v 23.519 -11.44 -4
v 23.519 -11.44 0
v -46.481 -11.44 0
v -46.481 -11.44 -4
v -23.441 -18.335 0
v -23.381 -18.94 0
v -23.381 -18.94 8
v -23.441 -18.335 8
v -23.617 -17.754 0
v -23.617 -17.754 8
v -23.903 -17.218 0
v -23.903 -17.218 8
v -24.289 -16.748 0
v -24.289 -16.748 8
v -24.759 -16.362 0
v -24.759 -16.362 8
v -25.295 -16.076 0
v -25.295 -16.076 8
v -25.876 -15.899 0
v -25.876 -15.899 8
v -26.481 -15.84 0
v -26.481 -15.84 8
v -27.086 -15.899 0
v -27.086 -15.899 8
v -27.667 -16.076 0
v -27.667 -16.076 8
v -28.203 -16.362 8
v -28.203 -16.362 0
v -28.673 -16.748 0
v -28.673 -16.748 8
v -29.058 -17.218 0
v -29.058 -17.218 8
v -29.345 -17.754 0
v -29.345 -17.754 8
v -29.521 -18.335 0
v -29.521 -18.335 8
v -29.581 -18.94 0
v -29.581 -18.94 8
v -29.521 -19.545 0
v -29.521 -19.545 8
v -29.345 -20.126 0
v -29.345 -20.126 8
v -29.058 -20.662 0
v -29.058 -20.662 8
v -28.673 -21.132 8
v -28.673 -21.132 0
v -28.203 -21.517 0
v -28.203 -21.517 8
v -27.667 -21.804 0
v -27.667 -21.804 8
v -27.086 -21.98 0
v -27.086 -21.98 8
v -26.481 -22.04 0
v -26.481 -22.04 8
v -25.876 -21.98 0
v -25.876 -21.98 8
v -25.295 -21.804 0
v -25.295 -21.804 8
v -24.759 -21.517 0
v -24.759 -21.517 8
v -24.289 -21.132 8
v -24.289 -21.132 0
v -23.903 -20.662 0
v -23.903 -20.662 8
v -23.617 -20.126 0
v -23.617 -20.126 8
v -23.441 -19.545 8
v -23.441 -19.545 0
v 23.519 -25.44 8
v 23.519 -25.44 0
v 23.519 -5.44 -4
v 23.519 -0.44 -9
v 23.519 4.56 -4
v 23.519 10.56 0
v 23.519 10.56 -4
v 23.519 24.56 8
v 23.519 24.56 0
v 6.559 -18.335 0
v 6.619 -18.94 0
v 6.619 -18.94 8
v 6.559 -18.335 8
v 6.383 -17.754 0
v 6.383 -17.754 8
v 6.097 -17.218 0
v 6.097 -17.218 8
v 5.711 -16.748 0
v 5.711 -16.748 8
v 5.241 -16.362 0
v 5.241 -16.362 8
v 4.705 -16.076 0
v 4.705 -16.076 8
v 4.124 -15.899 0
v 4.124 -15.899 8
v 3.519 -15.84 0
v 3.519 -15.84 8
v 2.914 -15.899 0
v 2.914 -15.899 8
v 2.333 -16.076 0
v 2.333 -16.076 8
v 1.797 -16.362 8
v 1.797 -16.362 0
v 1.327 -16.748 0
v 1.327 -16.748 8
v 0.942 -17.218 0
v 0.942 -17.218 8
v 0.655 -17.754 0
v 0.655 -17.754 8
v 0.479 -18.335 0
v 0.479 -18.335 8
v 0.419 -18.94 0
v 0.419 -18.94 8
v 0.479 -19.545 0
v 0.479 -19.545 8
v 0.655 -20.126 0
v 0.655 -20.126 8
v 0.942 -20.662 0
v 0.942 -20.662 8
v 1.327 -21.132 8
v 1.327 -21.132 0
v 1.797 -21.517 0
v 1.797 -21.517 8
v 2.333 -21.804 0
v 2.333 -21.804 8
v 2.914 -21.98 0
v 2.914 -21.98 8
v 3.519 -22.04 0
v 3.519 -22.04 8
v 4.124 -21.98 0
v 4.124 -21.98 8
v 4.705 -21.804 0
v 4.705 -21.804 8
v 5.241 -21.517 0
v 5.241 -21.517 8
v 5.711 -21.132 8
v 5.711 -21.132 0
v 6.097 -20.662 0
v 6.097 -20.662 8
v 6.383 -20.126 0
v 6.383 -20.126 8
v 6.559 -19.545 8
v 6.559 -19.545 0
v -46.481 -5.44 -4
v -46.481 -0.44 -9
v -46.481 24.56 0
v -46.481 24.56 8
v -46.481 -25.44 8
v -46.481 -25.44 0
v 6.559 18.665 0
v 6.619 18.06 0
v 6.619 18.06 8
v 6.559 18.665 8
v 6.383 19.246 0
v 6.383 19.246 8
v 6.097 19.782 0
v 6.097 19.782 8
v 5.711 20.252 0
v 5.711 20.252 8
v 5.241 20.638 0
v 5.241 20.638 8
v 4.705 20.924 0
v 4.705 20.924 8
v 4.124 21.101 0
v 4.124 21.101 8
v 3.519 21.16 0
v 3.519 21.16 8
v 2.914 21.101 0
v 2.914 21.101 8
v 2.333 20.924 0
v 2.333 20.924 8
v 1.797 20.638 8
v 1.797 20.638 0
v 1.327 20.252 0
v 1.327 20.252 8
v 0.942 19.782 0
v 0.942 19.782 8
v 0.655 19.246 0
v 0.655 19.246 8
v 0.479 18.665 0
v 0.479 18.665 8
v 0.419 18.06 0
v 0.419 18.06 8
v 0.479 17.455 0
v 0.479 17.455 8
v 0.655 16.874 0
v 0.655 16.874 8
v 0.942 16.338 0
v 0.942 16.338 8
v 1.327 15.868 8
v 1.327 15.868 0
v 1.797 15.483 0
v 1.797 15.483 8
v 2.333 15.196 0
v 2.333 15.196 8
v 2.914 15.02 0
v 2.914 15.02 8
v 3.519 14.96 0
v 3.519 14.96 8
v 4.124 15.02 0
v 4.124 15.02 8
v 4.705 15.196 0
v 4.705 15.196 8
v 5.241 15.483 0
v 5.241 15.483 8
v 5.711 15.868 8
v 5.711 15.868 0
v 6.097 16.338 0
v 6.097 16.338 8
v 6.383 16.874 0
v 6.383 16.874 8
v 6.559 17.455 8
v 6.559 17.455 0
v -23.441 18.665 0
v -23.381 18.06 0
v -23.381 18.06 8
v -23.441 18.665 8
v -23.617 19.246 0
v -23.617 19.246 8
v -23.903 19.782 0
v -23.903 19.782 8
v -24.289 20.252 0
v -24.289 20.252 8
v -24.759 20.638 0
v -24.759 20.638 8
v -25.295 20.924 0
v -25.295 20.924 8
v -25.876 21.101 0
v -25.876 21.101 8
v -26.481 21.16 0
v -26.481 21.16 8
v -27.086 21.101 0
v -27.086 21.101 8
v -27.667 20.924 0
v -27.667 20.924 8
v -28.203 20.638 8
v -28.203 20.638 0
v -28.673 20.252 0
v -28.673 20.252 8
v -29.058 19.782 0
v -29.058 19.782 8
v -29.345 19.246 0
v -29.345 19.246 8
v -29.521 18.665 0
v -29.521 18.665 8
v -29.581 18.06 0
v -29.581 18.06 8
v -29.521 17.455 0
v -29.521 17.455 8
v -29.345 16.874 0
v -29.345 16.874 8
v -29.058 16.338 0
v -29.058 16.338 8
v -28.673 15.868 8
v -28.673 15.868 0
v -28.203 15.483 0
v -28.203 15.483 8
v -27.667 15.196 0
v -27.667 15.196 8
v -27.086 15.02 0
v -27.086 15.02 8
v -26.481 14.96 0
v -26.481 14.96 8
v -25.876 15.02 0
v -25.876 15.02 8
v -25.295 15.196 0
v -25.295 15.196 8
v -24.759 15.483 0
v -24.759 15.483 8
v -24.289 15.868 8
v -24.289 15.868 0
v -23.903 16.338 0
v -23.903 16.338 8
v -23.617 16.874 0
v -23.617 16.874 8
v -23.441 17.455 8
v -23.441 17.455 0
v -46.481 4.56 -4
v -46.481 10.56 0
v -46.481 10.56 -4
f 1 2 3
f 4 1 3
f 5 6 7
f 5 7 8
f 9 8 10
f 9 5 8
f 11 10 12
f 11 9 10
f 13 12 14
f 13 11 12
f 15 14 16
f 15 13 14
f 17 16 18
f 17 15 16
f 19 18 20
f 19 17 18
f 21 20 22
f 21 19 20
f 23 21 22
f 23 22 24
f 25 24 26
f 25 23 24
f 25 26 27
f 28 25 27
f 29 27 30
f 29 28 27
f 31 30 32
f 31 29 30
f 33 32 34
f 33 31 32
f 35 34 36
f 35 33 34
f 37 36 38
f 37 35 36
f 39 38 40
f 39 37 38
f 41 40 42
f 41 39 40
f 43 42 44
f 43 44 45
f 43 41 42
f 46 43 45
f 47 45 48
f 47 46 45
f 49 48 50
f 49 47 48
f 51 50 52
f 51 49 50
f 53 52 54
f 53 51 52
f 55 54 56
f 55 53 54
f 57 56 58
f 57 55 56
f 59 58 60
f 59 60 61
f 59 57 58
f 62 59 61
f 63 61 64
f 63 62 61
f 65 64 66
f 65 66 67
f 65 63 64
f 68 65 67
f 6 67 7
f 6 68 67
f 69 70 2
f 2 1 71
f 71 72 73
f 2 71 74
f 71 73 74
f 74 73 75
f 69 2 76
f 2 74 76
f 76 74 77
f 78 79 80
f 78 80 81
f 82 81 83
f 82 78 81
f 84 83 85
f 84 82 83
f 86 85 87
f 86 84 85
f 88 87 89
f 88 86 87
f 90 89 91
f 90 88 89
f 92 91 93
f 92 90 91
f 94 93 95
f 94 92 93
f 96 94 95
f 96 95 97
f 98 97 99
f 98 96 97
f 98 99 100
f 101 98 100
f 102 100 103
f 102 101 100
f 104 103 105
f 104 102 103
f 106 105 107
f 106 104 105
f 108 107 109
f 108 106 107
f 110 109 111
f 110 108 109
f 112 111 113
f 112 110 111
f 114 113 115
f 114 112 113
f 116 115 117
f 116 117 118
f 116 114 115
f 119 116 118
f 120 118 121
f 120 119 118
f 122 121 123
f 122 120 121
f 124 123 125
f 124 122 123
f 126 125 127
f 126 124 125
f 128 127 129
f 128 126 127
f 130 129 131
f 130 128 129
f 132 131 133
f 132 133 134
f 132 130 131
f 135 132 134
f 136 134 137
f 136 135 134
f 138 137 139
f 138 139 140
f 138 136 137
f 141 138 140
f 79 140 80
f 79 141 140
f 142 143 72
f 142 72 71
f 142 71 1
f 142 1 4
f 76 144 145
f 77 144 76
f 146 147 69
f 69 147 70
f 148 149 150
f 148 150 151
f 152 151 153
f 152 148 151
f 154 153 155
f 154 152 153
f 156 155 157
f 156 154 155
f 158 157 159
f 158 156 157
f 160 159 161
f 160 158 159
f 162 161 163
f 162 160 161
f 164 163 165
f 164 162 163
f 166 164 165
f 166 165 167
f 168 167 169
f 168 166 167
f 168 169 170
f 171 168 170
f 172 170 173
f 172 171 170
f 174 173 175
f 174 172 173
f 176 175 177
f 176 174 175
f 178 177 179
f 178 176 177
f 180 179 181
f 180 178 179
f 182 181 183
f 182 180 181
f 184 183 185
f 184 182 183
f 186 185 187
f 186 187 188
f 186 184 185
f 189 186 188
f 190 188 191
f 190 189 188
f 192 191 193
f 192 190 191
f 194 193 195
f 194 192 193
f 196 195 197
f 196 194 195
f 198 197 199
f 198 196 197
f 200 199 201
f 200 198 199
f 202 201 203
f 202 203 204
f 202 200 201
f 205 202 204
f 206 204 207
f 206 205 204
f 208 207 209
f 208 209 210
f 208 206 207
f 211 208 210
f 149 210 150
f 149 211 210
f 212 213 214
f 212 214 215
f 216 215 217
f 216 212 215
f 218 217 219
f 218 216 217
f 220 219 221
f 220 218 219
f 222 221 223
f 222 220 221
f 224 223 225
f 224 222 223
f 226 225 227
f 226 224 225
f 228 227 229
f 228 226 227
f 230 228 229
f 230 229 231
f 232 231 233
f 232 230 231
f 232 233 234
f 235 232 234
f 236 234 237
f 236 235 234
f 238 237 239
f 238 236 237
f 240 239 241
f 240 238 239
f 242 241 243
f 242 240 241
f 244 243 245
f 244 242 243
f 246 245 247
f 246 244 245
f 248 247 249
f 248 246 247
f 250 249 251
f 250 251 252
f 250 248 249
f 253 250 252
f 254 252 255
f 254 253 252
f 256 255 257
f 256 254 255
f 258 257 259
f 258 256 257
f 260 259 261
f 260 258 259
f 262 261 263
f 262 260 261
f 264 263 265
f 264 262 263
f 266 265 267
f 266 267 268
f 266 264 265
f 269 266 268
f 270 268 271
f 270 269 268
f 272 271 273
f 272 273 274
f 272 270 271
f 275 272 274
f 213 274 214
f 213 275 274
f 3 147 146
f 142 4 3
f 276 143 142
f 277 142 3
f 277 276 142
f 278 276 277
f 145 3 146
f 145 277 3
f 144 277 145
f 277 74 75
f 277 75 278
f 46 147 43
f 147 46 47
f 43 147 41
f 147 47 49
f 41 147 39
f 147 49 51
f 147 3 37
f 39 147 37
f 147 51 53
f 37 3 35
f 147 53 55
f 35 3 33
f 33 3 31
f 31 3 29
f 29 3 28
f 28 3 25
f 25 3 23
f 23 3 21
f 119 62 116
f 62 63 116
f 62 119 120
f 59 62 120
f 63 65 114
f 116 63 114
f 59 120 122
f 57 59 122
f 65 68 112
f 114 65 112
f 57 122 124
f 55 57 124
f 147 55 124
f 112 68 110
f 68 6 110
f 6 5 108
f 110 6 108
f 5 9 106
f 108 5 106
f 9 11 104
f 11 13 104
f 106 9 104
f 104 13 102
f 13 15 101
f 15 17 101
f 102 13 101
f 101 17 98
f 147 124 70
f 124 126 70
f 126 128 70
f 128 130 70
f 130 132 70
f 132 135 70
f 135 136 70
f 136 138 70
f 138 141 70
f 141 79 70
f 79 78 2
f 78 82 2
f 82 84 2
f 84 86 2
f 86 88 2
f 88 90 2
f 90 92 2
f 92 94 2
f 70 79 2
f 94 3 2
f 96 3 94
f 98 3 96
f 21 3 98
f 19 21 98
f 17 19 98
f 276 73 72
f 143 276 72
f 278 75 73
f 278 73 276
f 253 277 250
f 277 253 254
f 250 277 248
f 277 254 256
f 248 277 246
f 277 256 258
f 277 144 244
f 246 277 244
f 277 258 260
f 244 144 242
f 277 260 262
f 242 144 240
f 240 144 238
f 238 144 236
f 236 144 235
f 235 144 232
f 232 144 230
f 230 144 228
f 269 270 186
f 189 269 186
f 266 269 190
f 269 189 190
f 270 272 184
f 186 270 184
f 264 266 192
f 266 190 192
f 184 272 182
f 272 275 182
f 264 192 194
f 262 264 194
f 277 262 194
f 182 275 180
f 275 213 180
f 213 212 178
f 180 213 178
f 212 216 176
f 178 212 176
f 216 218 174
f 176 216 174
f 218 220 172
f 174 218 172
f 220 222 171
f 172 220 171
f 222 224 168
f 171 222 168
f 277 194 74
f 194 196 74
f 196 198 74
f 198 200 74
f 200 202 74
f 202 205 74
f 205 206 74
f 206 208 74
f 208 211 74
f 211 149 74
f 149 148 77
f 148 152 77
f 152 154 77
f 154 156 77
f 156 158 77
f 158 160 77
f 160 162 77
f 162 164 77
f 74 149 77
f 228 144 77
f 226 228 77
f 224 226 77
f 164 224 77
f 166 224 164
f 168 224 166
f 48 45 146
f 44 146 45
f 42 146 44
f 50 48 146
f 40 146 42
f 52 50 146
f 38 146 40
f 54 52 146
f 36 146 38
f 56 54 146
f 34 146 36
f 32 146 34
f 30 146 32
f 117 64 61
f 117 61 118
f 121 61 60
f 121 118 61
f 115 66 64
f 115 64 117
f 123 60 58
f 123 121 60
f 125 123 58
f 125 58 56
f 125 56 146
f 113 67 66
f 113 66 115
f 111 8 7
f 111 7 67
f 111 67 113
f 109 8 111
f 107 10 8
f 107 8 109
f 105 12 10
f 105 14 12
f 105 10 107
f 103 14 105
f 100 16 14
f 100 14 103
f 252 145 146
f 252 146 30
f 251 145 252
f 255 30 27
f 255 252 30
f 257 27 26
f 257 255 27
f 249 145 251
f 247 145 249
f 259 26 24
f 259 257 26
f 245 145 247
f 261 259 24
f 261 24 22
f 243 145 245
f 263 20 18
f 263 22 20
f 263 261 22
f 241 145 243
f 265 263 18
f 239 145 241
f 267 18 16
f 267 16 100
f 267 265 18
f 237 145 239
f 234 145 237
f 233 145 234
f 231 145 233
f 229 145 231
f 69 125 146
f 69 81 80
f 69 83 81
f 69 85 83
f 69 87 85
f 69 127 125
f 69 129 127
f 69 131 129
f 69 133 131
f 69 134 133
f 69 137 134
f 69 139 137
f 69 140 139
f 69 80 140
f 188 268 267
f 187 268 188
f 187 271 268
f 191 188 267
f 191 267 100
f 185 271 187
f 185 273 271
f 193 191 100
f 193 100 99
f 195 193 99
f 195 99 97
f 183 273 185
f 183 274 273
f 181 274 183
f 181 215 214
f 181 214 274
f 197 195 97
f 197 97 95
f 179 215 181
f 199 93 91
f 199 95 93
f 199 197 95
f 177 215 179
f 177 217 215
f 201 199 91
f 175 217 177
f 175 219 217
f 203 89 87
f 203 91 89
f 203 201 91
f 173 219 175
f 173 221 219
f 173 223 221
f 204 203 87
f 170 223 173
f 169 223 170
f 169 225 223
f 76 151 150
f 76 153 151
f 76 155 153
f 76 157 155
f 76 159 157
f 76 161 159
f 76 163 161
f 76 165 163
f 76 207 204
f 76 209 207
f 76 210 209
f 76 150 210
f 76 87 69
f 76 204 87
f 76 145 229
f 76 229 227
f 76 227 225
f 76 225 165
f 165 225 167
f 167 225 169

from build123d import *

# Parameters (mm, degrees)
SKETCH1_W           = 70
SKETCH1_H           = 50
SKETCH1_R           = 3.1
BOSS_EXTRUDE1_DEPTH = 8
SKETCH3_W           = 70
SKETCH3_H           = 22
BOSS_EXTRUDE2_DEPTH = 4
BOSS_EXTRUDE3_DEPTH = 70


with BuildPart() as part:
    # Sketch1 → Boss-Extrude1 (new body)
    with BuildSketch(Plane.XY):
        with Locations((-11.480938416, -0.439882698)):
            Rectangle(SKETCH1_W, SKETCH1_H)
        with Locations((-26.480938416, 18.060117302)):
            Circle(SKETCH1_R, mode=Mode.SUBTRACT)
        with Locations((3.519061584, 18.060117302)):
            Circle(SKETCH1_R, mode=Mode.SUBTRACT)
        with Locations((-26.480938416, -18.939882698)):
            Circle(SKETCH1_R, mode=Mode.SUBTRACT)
        with Locations((3.519061584, -18.939882698)):
            Circle(SKETCH1_R, mode=Mode.SUBTRACT)
    extrude(amount=BOSS_EXTRUDE1_DEPTH)

    # Sketch3 → Boss-Extrude2 (add)
    with BuildSketch(Plane(origin=(0, 0, 0), x_dir=(-1, 0, 0), z_dir=(0, 0, -1))):
        with Locations((11.480938416, -0.439882698)):
            Rectangle(SKETCH3_W, SKETCH3_H)
    extrude(amount=BOSS_EXTRUDE2_DEPTH)

    # Sketch4 → Boss-Extrude3 (add)
    with BuildSketch(Plane.ZY.offset(46.480938416)):
        Polygon((-9, -0.439882698), (-4, -5.439882698), (-4, -0.439882698), (-4, 4.560117302), align=None)
    extrude(amount=-BOSS_EXTRUDE3_DEPTH)


solid = part.part
